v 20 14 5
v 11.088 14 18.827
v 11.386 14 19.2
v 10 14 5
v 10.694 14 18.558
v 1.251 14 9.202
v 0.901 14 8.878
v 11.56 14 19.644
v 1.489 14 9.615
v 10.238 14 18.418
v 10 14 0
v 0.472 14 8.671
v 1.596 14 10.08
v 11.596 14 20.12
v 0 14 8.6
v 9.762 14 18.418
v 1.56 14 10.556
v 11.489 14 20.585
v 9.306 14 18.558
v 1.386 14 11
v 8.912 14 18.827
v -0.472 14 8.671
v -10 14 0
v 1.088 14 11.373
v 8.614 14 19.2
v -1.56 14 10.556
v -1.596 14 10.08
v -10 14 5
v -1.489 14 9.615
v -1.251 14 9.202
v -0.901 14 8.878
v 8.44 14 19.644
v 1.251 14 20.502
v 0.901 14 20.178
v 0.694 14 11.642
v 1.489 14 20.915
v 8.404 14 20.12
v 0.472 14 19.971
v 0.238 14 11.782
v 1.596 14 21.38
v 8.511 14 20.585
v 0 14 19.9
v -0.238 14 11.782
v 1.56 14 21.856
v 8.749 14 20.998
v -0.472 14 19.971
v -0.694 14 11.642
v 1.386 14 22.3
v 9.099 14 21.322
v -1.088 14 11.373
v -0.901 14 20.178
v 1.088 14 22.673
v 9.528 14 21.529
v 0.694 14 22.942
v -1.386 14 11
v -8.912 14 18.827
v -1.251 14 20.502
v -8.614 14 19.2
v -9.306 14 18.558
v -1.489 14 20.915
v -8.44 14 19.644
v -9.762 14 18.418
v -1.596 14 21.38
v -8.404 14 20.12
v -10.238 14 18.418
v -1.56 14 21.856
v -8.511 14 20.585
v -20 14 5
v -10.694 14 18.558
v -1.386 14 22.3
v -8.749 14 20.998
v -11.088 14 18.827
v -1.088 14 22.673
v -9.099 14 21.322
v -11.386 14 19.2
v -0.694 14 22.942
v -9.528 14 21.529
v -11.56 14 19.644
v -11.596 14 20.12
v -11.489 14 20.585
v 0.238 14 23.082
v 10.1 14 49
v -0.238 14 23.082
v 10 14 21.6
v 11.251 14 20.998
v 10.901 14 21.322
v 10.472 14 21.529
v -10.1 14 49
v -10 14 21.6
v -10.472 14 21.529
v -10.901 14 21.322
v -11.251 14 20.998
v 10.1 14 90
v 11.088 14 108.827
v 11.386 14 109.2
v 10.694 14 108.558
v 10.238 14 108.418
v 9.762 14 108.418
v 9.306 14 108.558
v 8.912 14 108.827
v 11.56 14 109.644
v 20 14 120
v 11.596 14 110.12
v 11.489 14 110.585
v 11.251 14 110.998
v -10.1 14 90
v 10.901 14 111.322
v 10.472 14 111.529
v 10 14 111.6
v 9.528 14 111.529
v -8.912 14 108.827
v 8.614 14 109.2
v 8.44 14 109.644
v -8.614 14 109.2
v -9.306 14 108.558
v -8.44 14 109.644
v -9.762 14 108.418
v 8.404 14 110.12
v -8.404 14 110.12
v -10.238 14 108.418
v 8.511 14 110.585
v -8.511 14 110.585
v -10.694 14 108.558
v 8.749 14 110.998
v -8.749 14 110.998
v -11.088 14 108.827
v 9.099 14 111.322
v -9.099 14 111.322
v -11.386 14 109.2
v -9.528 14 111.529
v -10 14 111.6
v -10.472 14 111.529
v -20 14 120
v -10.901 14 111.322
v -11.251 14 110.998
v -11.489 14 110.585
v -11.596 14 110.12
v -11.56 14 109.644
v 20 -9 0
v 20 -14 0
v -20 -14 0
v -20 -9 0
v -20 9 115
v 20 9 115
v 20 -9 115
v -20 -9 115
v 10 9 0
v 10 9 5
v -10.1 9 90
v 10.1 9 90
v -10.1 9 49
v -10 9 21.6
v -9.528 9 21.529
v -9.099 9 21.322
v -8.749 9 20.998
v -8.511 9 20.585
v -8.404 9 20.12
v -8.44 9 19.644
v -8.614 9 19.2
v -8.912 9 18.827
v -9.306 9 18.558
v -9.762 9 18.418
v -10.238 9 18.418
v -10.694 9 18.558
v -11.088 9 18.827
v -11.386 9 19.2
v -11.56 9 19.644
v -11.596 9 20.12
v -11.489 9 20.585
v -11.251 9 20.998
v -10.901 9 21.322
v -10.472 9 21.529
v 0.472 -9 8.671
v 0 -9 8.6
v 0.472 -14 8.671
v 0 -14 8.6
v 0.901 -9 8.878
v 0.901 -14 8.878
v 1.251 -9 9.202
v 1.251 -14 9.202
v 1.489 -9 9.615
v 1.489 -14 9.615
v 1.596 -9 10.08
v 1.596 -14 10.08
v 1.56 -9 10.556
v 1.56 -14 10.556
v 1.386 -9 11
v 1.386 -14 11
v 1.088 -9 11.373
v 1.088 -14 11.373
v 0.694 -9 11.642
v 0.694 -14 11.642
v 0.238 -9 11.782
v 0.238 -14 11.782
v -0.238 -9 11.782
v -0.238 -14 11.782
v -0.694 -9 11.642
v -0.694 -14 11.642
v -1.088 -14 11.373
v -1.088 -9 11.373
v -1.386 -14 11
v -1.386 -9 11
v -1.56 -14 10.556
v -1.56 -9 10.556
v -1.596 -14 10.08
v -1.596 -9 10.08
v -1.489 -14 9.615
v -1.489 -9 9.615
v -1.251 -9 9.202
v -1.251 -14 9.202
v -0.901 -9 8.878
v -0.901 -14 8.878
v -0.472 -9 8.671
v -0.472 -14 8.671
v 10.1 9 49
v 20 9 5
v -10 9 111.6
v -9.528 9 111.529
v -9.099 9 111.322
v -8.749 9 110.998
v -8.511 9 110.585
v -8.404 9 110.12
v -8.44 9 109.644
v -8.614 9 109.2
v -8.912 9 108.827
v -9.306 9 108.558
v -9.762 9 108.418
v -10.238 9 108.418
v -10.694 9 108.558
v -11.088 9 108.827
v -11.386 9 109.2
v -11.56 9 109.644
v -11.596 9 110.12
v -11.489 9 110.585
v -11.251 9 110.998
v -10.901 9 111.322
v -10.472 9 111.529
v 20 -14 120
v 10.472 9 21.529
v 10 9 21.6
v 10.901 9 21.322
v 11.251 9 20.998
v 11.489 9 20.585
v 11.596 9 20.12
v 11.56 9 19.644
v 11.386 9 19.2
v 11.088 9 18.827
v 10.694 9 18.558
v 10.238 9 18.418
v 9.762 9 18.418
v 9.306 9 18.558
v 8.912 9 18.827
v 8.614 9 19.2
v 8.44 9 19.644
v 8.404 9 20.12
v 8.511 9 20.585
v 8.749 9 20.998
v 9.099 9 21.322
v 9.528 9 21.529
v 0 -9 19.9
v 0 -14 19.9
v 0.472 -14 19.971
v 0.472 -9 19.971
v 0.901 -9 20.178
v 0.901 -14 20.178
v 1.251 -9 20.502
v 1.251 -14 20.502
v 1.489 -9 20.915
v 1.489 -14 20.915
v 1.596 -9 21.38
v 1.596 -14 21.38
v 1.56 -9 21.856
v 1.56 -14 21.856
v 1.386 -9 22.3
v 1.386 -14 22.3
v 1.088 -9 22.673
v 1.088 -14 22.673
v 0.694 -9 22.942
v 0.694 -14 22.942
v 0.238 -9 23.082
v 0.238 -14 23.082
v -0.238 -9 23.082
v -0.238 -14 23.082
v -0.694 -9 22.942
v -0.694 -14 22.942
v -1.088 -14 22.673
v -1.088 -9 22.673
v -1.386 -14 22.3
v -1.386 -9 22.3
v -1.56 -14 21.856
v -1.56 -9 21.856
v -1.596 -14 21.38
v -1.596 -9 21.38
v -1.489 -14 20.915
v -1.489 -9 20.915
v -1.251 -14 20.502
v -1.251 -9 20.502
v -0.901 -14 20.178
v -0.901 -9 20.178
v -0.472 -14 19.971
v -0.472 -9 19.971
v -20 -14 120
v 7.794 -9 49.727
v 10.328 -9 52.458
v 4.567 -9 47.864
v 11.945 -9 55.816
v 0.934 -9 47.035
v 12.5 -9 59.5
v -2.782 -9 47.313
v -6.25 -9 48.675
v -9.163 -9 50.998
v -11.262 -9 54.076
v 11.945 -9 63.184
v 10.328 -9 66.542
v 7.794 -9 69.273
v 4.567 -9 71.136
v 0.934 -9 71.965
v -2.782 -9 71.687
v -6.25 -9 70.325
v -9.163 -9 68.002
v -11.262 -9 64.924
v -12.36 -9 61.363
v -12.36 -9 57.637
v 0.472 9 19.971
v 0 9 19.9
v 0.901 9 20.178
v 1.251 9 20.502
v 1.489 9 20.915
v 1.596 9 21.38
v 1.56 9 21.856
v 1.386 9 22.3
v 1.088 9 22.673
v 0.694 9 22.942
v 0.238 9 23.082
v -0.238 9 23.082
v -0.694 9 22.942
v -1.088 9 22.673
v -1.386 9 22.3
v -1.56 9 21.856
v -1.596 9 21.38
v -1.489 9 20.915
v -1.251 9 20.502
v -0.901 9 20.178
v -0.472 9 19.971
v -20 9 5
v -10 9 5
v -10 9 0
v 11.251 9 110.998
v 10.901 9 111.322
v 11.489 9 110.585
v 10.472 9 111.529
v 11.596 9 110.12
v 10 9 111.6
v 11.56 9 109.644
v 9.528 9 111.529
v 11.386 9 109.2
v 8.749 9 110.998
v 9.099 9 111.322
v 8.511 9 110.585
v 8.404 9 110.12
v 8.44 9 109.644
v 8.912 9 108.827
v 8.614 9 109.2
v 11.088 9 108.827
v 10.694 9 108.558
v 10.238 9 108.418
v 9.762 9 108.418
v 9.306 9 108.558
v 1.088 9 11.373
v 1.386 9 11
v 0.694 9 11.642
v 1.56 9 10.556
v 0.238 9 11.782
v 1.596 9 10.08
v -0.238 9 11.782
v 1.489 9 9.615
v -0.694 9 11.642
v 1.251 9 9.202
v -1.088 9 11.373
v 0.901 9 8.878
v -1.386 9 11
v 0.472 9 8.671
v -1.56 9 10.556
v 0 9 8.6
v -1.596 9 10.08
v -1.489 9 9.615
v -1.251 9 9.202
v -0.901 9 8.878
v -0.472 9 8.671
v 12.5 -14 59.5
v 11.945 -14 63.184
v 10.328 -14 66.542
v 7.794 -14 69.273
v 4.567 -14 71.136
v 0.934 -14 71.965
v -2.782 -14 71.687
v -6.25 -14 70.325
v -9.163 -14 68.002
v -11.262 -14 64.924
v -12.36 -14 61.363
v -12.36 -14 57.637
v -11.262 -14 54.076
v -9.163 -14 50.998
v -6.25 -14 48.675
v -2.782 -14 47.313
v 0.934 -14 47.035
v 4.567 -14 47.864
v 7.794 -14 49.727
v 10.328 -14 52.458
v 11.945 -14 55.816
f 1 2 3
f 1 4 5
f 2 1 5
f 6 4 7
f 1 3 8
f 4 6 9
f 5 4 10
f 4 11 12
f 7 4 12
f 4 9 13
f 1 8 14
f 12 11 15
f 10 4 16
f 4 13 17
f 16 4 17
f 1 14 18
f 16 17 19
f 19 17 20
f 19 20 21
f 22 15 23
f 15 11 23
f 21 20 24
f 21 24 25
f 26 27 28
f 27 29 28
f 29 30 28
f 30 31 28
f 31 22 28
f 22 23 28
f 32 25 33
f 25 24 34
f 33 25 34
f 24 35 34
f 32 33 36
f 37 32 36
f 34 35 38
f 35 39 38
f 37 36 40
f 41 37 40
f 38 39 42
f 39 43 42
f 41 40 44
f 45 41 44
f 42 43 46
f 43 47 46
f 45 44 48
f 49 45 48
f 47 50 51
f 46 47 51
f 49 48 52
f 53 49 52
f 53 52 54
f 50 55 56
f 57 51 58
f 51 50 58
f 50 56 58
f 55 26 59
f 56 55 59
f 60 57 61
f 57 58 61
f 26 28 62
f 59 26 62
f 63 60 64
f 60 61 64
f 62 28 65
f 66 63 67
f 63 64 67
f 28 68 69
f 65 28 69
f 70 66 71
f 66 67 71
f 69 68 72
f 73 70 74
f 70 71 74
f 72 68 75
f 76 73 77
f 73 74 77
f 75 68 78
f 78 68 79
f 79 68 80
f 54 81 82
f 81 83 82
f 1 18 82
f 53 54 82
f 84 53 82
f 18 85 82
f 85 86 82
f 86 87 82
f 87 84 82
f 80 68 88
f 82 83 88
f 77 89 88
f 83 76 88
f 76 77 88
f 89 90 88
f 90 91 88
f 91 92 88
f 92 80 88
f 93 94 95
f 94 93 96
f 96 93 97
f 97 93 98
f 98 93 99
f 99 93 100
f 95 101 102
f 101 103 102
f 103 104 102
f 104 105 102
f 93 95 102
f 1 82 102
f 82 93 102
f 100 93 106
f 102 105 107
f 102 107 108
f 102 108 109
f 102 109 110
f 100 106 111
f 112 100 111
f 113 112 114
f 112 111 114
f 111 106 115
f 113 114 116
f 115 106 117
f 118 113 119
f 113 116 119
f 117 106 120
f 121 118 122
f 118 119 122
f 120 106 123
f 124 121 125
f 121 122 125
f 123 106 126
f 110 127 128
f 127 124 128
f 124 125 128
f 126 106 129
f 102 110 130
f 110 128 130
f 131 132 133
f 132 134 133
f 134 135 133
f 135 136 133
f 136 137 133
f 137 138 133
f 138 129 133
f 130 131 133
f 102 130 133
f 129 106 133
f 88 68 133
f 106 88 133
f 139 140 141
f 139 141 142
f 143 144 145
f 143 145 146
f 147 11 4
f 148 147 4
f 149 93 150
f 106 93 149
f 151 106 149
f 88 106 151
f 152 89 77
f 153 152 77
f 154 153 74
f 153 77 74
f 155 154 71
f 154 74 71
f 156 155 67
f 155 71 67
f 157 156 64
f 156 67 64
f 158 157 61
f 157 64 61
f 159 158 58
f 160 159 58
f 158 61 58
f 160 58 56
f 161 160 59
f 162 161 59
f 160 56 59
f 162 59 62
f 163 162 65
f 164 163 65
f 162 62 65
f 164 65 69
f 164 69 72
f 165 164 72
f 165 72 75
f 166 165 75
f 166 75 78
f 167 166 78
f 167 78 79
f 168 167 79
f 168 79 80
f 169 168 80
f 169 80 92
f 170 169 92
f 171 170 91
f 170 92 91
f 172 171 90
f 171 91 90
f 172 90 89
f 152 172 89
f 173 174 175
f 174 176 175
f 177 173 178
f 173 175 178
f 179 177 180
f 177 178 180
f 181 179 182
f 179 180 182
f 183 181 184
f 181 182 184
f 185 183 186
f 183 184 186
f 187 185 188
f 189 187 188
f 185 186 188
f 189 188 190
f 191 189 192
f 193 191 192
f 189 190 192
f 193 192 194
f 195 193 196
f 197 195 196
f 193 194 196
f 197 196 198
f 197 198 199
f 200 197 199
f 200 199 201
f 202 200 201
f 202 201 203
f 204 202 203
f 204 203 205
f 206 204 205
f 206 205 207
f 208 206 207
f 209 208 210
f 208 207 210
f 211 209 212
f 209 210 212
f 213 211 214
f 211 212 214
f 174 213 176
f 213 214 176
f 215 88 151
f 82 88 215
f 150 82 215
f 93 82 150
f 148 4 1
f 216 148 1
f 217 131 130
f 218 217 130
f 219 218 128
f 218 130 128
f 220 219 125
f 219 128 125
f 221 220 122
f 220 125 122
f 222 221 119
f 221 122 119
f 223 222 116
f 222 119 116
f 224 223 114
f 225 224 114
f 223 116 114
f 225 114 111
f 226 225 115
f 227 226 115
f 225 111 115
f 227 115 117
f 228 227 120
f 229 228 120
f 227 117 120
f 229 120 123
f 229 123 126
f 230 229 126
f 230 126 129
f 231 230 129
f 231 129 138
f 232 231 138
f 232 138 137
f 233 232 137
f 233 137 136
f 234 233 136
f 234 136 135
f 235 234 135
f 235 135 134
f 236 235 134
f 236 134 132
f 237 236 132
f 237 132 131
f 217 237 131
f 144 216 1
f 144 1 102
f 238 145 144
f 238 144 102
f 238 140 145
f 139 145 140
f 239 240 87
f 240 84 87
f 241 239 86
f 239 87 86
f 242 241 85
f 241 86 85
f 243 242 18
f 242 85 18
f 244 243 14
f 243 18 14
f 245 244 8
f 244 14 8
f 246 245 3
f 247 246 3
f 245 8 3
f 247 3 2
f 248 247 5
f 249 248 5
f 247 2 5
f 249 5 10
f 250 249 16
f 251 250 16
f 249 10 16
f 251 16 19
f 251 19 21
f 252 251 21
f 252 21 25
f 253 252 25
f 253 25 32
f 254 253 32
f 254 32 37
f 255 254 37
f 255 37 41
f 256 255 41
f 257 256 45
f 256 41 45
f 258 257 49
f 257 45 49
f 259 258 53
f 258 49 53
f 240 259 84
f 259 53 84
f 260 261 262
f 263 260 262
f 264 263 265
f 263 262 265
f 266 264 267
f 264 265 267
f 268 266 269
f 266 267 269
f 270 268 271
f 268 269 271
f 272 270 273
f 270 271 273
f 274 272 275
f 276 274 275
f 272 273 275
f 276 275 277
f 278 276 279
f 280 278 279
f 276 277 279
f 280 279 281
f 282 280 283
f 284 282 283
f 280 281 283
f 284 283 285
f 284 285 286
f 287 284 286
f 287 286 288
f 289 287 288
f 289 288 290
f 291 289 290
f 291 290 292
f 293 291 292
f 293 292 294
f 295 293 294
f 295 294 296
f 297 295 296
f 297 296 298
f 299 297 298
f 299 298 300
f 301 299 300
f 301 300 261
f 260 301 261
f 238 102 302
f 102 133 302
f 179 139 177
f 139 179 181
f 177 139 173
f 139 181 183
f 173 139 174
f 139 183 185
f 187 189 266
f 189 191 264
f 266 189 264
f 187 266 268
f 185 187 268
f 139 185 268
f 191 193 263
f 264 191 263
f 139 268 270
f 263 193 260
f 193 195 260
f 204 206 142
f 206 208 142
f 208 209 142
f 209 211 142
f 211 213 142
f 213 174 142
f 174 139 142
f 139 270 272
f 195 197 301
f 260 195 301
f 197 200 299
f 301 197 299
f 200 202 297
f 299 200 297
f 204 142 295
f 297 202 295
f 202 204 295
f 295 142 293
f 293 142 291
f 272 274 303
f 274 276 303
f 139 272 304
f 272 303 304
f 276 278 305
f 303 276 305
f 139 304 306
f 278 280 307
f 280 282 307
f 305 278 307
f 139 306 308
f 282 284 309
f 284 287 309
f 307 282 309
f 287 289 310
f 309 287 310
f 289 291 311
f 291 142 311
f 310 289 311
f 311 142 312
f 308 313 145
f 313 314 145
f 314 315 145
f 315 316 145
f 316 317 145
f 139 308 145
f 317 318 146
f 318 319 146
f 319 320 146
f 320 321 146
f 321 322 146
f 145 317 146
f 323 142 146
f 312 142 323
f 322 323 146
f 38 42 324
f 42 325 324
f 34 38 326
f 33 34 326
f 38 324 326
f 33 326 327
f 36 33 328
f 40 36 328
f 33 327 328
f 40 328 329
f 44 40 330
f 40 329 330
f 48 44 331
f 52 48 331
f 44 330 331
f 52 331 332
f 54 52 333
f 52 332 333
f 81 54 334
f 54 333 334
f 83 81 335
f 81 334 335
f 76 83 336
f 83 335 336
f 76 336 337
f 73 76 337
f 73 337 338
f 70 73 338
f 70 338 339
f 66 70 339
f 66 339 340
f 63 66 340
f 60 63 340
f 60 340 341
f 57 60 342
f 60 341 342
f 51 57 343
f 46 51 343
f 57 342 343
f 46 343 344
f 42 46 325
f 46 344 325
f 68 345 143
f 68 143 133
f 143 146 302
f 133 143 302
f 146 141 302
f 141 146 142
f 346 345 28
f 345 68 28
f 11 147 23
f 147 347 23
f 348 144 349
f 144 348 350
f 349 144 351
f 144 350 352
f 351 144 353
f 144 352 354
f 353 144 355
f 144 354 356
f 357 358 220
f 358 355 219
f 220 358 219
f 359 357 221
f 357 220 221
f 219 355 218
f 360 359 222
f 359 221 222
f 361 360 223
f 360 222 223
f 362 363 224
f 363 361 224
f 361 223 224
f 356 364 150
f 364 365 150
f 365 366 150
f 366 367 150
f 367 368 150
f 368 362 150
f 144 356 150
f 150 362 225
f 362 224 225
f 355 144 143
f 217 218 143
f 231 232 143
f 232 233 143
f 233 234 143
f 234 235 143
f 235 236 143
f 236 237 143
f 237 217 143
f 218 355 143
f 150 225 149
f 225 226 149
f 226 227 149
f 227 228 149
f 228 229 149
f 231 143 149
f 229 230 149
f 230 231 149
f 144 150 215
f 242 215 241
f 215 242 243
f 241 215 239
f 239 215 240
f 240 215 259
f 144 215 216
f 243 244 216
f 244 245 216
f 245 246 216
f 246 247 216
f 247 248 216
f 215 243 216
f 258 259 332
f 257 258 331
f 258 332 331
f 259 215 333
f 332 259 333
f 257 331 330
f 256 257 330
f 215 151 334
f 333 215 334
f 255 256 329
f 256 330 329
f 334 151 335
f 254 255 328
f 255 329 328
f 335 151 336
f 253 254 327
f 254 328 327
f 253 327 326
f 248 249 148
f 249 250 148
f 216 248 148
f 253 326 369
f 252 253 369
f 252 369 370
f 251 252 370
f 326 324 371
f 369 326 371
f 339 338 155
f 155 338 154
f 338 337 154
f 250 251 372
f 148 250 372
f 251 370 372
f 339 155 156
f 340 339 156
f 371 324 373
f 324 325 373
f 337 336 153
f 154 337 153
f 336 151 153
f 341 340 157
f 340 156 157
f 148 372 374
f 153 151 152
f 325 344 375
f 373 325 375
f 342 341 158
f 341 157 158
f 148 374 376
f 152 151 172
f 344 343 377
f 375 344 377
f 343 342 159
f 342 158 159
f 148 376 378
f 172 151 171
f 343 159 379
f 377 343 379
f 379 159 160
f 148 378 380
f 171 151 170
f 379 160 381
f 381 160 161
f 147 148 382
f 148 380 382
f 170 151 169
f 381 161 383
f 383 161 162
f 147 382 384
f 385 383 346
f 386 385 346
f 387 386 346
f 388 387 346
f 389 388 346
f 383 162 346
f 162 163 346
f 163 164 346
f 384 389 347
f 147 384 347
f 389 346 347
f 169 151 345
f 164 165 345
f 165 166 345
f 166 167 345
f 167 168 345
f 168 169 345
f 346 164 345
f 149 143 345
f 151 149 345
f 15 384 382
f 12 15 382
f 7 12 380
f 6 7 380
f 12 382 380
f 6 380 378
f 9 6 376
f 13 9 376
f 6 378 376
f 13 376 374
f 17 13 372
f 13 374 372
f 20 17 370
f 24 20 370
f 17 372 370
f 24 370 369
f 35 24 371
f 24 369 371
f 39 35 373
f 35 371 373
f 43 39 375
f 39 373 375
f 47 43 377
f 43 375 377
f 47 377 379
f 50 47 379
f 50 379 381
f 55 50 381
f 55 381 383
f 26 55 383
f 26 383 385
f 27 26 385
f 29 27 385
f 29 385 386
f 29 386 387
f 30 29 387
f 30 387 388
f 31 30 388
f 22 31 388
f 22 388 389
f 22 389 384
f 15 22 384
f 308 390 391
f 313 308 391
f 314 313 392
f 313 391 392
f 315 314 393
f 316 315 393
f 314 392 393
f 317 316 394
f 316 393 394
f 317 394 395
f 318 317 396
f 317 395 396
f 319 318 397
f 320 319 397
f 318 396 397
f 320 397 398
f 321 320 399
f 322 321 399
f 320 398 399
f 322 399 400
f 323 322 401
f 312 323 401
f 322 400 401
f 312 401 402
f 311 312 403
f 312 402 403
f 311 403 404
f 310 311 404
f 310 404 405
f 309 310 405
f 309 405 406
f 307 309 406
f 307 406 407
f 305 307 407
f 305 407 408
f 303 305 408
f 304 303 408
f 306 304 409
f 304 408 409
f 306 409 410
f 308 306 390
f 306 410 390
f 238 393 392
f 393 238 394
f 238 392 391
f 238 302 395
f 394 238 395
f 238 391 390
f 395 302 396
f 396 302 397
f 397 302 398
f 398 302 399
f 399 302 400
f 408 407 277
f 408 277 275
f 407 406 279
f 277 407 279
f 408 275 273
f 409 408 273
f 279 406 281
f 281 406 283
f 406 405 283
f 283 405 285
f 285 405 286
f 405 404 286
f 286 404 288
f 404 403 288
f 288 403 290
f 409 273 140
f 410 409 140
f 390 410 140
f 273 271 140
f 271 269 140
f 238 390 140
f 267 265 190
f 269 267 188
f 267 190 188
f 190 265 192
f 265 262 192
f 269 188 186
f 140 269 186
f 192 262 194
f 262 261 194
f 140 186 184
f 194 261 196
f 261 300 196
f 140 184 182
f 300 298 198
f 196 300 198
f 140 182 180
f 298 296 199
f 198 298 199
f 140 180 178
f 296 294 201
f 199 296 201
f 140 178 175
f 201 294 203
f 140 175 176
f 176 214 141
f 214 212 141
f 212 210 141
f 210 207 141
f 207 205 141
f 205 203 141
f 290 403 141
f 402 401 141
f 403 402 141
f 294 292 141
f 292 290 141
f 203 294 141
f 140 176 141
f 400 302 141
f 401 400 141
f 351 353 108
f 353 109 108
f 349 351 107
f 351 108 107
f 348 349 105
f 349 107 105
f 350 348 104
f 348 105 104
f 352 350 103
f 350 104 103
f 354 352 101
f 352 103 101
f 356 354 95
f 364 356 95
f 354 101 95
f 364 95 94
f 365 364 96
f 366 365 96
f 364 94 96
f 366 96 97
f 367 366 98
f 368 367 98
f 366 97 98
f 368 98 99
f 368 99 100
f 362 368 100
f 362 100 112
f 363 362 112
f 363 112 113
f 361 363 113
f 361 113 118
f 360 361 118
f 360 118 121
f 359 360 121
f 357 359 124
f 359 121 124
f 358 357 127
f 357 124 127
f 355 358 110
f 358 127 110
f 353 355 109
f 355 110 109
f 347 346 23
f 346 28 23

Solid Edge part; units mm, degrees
sketch "Sketch1" plane through (0, 0, 0) normal (1, 0, 0) x (0, 1, 0)
  line L0 (-9, 115) -> (9, 115)
  line L1 (9, 115) -> (9, 0)
  line L2 (9, 0) -> (14, 0)
  line L3 (14, 0) -> (14, 120)
  line L4 (14, 120) -> (-14, 120)
  line L5 (-14, 120) -> (-14, 0)
  line L6 (-14, 0) -> (-9, 0)
  line L7 (-9, 0) -> (-9, 115)
extrude "Protrusion1" add sketch "Sketch1" along normal mid plane 40
sketch "Sketch2" plane through (0, 14, 45) normal (0, 1, 0) x (-1, 0, 0)
  line L0 (-10.1, 4) -> (-10.1, 45)
  line L1 (-10.1, 45) -> (10.1, 45)
  line L2 (10.1, 45) -> (10.1, 4)
  line L3 (10.1, 4) -> (-10.1, 4)
extrude "Cutout1" cut sketch "Sketch2" against normal up to vertex (5 mm away)
sketch "Sketch3" plane through (0, -14, 45) normal (0, -1, 0) x (1, 0, 0)
  circle A0 centre (0, 14.5) radius 12.5
extrude "Cutout2" cut sketch "Sketch3" against normal up to vertex (5 mm away)
hole "Agujero_1" at (0, -14, 21.5) direction (0, 1, 0) diameter 3.2 end through all
hole "Hole1" at (0, -14, 10.2) direction (0, 1, 0) diameter 3.2 end through all
hole "Agujero_3" at (-10, 14, 20) direction (0, -1, 0) diameter 3.2 end up to next
hole "Hole2" at (10, 14, 20) direction (0, -1, 0) diameter 3.2 end up to next
hole "Agujero_5" at (-10, 14, 110) direction (0, -1, 0) diameter 3.2 end up to next
hole "Hole3" at (10, 14, 110) direction (0, -1, 0) diameter 3.2 end up to next
sketch "Sketch4" plane through (0, 14, 60) normal (0, 1, 0) x (-1, 0, 0)
  line L0 (20, -55) -> (10, -55)
  line L1 (10, -55) -> (10, -60)
  line L2 (10, -60) -> (20, -60)
  line L3 (20, -60) -> (20, -55)
extrude "Cutout3" cut sketch "Sketch4" against normal up to vertex (5 mm away)
mirror "Mirror1" about plane through (0, 0, 0) normal (1, 0, 0) of "Cutout3"
sketch "Sketch5" plane through (0, 0, 120) normal (0, 0, 1) x (0, 1, 0)
  line L0 (-9, 20) -> (-9, 10)
  line L1 (-9, 10) -> (-14, 10)
  line L2 (-14, -10) -> (-14, 10)
  line L3 (-14, -10) -> (-9, -10)
  line L4 (-9, -10) -> (-9, -20)
  line L5 (9, -20) -> (-9, -20)
  line L6 (9, -20) -> (9, -10)
  line L7 (9, -10) -> (14, -10)
  line L8 (14, 10) -> (14, -10)
  line L9 (14, 10) -> (9, 10)
  line L10 (9, 10) -> (9, 20)
  line L11 (-9, 20) -> (9, 20)
extrude "Cutout5" cut sketch "Sketch5" against normal up to vertex (5 mm away)
sketch "Sketch6" plane through (0, 0, 120) normal (0, 0, 1) x (0, 1, 0)
  line L0 (-9, 20) -> (9, 20)
  line L1 (9, 10) -> (9, 20)
  line L2 (14, 10) -> (9, 10)
  line L3 (14, 10) -> (14, -10)
  line L4 (9, -10) -> (14, -10)
  line L5 (9, -20) -> (9, -10)
  line L6 (9, -20) -> (-9, -20)
  line L7 (-9, -10) -> (-9, -20)
  line L8 (-14, -10) -> (-9, -10)
  line L9 (-14, -10) -> (-14, 10)
  line L10 (-9, 10) -> (-14, 10)
  line L11 (-9, 20) -> (-9, 10)
extrude "Protrusion2" add sketch "Sketch6" against normal up to vertex (5 mm away)
